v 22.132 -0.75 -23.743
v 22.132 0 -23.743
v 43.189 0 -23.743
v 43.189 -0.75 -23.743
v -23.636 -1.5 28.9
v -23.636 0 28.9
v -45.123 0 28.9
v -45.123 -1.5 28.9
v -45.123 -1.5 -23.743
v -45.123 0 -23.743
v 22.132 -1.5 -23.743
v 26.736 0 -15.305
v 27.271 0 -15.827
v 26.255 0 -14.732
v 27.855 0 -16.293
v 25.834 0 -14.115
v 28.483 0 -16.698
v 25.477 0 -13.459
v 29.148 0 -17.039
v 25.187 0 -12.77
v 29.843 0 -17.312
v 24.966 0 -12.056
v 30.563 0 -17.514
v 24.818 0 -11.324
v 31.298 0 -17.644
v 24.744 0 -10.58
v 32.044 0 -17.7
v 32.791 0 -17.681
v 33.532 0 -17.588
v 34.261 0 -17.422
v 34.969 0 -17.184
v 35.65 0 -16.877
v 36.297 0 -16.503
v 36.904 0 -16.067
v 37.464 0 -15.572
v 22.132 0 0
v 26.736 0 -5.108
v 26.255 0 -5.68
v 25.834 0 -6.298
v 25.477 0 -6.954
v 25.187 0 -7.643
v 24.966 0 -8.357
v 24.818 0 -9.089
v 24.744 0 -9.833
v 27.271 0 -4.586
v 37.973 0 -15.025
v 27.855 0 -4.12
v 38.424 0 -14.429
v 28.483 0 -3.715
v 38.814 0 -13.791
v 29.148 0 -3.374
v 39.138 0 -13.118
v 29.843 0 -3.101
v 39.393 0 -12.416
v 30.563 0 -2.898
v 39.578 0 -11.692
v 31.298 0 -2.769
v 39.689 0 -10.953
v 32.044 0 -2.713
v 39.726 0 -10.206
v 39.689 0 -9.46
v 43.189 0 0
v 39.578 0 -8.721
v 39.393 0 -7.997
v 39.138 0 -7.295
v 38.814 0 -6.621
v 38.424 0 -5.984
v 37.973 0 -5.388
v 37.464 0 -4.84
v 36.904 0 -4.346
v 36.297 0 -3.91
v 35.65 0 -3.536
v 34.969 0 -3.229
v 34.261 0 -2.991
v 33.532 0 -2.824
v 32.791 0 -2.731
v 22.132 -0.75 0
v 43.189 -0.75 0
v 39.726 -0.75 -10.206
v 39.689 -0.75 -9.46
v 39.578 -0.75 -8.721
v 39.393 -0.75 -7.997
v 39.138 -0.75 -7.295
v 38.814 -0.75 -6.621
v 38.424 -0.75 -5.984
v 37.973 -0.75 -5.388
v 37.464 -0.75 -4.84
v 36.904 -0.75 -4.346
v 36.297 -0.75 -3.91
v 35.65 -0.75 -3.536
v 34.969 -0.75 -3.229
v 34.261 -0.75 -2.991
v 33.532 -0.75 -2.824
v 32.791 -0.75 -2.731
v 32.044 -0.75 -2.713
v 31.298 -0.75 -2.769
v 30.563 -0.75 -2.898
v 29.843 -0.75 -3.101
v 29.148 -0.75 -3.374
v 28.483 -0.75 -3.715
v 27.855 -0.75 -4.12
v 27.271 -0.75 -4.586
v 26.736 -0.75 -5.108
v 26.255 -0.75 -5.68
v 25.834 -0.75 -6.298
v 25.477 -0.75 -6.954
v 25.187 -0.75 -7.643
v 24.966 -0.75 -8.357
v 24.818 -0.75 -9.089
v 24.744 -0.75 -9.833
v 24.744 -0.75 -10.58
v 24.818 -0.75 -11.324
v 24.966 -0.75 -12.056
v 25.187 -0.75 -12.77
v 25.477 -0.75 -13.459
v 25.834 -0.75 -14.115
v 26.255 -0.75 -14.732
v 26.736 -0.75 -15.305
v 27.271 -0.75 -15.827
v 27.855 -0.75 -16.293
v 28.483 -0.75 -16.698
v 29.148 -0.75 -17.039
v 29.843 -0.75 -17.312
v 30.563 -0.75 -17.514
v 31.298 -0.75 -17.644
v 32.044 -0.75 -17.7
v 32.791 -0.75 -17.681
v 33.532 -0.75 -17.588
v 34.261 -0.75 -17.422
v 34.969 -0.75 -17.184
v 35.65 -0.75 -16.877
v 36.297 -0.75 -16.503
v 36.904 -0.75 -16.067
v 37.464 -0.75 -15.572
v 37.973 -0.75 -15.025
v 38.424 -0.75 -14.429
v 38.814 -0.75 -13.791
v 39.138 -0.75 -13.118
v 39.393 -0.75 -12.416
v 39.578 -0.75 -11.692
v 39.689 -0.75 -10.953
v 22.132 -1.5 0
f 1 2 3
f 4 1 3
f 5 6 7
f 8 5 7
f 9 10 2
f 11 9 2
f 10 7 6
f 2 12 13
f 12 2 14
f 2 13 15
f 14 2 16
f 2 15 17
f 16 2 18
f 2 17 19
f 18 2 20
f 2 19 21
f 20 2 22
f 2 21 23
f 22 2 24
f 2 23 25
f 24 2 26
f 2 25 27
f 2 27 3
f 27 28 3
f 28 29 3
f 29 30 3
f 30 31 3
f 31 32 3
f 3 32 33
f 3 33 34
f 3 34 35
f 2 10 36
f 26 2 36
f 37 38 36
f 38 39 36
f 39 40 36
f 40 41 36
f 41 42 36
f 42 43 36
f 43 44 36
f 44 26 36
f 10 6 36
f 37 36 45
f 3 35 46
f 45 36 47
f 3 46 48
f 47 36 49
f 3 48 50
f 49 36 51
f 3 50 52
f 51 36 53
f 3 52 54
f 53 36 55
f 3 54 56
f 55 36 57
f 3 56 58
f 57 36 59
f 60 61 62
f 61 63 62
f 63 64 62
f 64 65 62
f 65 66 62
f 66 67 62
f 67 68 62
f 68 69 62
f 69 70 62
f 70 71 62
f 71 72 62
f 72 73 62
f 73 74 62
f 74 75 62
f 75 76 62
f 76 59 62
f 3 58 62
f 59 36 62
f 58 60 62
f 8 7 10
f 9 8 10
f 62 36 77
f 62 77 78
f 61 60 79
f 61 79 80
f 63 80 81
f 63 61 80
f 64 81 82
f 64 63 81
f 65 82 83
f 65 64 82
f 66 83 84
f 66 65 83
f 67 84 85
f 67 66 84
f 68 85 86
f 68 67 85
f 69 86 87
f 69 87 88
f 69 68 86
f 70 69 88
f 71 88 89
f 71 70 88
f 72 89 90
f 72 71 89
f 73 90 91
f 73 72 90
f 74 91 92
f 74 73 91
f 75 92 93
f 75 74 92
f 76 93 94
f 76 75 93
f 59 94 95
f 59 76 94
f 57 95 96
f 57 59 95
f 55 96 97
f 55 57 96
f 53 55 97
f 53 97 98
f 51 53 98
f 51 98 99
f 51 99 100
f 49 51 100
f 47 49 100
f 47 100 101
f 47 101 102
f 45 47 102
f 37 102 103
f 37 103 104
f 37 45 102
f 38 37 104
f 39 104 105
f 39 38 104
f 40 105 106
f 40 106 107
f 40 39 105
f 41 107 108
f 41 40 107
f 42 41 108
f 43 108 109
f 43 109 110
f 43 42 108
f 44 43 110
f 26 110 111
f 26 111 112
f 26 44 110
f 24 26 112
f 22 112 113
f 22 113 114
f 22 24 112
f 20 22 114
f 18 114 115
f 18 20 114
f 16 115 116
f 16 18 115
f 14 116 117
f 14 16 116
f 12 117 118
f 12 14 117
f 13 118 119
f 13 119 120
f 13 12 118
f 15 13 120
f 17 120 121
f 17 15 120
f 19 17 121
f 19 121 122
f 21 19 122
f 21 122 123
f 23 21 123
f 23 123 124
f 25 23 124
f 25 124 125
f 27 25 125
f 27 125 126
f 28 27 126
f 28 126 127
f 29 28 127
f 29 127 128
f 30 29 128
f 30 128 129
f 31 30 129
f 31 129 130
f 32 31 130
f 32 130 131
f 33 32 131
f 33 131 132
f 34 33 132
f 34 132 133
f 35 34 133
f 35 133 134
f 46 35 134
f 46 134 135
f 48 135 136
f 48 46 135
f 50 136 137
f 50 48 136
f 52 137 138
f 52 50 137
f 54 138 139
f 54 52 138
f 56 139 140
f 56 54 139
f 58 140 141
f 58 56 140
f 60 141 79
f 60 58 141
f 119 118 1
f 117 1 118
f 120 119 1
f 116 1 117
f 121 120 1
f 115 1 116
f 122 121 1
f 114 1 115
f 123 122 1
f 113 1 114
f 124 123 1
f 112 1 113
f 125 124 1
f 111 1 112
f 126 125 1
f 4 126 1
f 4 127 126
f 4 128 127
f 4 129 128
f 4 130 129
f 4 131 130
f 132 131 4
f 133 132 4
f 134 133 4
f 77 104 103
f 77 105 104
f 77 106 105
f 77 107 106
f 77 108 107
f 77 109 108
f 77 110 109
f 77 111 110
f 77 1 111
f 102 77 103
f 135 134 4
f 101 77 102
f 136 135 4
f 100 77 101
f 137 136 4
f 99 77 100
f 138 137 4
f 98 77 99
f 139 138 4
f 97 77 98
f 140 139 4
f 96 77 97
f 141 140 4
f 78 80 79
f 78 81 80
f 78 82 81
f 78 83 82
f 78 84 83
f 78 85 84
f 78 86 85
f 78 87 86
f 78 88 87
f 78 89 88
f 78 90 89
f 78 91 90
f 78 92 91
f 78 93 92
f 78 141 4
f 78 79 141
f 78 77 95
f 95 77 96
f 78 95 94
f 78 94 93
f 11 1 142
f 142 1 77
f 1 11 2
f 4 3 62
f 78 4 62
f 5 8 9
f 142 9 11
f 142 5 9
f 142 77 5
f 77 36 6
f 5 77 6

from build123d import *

# Parameters (mm, degrees)
F1_DEPTH = 1.5
F0_W     = 21.057298
F0_H     = 23.743179
F0_R     = 7.495866
F2_DEPTH = 0.75


with BuildPart() as f1:
    # F0 (on Front) → F1 (new body)
    with BuildSketch(Plane.XZ):
        Polygon((-23.635745, 28.90007), (-45.122784, 28.90007), (-45.122784, -23.743179), (22.131654, -23.743179), (22.131654, 0), align=None)
    extrude(amount=F1_DEPTH)

    # F0 (on Front) → F2 (join)
    with BuildSketch(Plane.XZ):
        Polygon((-23.635745, 28.90007), (-45.122784, 28.90007), (-45.122784, -23.743179), (22.131654, -23.743179), (22.131654, 0), align=None)
        with Locations((32.660303, -11.871589)):
            Rectangle(F0_W, F0_H)
        with Locations((32.23056, -10.206345)):
            Circle(F0_R, mode=Mode.SUBTRACT)
    extrude(amount=F2_DEPTH)


solid = f1.part
